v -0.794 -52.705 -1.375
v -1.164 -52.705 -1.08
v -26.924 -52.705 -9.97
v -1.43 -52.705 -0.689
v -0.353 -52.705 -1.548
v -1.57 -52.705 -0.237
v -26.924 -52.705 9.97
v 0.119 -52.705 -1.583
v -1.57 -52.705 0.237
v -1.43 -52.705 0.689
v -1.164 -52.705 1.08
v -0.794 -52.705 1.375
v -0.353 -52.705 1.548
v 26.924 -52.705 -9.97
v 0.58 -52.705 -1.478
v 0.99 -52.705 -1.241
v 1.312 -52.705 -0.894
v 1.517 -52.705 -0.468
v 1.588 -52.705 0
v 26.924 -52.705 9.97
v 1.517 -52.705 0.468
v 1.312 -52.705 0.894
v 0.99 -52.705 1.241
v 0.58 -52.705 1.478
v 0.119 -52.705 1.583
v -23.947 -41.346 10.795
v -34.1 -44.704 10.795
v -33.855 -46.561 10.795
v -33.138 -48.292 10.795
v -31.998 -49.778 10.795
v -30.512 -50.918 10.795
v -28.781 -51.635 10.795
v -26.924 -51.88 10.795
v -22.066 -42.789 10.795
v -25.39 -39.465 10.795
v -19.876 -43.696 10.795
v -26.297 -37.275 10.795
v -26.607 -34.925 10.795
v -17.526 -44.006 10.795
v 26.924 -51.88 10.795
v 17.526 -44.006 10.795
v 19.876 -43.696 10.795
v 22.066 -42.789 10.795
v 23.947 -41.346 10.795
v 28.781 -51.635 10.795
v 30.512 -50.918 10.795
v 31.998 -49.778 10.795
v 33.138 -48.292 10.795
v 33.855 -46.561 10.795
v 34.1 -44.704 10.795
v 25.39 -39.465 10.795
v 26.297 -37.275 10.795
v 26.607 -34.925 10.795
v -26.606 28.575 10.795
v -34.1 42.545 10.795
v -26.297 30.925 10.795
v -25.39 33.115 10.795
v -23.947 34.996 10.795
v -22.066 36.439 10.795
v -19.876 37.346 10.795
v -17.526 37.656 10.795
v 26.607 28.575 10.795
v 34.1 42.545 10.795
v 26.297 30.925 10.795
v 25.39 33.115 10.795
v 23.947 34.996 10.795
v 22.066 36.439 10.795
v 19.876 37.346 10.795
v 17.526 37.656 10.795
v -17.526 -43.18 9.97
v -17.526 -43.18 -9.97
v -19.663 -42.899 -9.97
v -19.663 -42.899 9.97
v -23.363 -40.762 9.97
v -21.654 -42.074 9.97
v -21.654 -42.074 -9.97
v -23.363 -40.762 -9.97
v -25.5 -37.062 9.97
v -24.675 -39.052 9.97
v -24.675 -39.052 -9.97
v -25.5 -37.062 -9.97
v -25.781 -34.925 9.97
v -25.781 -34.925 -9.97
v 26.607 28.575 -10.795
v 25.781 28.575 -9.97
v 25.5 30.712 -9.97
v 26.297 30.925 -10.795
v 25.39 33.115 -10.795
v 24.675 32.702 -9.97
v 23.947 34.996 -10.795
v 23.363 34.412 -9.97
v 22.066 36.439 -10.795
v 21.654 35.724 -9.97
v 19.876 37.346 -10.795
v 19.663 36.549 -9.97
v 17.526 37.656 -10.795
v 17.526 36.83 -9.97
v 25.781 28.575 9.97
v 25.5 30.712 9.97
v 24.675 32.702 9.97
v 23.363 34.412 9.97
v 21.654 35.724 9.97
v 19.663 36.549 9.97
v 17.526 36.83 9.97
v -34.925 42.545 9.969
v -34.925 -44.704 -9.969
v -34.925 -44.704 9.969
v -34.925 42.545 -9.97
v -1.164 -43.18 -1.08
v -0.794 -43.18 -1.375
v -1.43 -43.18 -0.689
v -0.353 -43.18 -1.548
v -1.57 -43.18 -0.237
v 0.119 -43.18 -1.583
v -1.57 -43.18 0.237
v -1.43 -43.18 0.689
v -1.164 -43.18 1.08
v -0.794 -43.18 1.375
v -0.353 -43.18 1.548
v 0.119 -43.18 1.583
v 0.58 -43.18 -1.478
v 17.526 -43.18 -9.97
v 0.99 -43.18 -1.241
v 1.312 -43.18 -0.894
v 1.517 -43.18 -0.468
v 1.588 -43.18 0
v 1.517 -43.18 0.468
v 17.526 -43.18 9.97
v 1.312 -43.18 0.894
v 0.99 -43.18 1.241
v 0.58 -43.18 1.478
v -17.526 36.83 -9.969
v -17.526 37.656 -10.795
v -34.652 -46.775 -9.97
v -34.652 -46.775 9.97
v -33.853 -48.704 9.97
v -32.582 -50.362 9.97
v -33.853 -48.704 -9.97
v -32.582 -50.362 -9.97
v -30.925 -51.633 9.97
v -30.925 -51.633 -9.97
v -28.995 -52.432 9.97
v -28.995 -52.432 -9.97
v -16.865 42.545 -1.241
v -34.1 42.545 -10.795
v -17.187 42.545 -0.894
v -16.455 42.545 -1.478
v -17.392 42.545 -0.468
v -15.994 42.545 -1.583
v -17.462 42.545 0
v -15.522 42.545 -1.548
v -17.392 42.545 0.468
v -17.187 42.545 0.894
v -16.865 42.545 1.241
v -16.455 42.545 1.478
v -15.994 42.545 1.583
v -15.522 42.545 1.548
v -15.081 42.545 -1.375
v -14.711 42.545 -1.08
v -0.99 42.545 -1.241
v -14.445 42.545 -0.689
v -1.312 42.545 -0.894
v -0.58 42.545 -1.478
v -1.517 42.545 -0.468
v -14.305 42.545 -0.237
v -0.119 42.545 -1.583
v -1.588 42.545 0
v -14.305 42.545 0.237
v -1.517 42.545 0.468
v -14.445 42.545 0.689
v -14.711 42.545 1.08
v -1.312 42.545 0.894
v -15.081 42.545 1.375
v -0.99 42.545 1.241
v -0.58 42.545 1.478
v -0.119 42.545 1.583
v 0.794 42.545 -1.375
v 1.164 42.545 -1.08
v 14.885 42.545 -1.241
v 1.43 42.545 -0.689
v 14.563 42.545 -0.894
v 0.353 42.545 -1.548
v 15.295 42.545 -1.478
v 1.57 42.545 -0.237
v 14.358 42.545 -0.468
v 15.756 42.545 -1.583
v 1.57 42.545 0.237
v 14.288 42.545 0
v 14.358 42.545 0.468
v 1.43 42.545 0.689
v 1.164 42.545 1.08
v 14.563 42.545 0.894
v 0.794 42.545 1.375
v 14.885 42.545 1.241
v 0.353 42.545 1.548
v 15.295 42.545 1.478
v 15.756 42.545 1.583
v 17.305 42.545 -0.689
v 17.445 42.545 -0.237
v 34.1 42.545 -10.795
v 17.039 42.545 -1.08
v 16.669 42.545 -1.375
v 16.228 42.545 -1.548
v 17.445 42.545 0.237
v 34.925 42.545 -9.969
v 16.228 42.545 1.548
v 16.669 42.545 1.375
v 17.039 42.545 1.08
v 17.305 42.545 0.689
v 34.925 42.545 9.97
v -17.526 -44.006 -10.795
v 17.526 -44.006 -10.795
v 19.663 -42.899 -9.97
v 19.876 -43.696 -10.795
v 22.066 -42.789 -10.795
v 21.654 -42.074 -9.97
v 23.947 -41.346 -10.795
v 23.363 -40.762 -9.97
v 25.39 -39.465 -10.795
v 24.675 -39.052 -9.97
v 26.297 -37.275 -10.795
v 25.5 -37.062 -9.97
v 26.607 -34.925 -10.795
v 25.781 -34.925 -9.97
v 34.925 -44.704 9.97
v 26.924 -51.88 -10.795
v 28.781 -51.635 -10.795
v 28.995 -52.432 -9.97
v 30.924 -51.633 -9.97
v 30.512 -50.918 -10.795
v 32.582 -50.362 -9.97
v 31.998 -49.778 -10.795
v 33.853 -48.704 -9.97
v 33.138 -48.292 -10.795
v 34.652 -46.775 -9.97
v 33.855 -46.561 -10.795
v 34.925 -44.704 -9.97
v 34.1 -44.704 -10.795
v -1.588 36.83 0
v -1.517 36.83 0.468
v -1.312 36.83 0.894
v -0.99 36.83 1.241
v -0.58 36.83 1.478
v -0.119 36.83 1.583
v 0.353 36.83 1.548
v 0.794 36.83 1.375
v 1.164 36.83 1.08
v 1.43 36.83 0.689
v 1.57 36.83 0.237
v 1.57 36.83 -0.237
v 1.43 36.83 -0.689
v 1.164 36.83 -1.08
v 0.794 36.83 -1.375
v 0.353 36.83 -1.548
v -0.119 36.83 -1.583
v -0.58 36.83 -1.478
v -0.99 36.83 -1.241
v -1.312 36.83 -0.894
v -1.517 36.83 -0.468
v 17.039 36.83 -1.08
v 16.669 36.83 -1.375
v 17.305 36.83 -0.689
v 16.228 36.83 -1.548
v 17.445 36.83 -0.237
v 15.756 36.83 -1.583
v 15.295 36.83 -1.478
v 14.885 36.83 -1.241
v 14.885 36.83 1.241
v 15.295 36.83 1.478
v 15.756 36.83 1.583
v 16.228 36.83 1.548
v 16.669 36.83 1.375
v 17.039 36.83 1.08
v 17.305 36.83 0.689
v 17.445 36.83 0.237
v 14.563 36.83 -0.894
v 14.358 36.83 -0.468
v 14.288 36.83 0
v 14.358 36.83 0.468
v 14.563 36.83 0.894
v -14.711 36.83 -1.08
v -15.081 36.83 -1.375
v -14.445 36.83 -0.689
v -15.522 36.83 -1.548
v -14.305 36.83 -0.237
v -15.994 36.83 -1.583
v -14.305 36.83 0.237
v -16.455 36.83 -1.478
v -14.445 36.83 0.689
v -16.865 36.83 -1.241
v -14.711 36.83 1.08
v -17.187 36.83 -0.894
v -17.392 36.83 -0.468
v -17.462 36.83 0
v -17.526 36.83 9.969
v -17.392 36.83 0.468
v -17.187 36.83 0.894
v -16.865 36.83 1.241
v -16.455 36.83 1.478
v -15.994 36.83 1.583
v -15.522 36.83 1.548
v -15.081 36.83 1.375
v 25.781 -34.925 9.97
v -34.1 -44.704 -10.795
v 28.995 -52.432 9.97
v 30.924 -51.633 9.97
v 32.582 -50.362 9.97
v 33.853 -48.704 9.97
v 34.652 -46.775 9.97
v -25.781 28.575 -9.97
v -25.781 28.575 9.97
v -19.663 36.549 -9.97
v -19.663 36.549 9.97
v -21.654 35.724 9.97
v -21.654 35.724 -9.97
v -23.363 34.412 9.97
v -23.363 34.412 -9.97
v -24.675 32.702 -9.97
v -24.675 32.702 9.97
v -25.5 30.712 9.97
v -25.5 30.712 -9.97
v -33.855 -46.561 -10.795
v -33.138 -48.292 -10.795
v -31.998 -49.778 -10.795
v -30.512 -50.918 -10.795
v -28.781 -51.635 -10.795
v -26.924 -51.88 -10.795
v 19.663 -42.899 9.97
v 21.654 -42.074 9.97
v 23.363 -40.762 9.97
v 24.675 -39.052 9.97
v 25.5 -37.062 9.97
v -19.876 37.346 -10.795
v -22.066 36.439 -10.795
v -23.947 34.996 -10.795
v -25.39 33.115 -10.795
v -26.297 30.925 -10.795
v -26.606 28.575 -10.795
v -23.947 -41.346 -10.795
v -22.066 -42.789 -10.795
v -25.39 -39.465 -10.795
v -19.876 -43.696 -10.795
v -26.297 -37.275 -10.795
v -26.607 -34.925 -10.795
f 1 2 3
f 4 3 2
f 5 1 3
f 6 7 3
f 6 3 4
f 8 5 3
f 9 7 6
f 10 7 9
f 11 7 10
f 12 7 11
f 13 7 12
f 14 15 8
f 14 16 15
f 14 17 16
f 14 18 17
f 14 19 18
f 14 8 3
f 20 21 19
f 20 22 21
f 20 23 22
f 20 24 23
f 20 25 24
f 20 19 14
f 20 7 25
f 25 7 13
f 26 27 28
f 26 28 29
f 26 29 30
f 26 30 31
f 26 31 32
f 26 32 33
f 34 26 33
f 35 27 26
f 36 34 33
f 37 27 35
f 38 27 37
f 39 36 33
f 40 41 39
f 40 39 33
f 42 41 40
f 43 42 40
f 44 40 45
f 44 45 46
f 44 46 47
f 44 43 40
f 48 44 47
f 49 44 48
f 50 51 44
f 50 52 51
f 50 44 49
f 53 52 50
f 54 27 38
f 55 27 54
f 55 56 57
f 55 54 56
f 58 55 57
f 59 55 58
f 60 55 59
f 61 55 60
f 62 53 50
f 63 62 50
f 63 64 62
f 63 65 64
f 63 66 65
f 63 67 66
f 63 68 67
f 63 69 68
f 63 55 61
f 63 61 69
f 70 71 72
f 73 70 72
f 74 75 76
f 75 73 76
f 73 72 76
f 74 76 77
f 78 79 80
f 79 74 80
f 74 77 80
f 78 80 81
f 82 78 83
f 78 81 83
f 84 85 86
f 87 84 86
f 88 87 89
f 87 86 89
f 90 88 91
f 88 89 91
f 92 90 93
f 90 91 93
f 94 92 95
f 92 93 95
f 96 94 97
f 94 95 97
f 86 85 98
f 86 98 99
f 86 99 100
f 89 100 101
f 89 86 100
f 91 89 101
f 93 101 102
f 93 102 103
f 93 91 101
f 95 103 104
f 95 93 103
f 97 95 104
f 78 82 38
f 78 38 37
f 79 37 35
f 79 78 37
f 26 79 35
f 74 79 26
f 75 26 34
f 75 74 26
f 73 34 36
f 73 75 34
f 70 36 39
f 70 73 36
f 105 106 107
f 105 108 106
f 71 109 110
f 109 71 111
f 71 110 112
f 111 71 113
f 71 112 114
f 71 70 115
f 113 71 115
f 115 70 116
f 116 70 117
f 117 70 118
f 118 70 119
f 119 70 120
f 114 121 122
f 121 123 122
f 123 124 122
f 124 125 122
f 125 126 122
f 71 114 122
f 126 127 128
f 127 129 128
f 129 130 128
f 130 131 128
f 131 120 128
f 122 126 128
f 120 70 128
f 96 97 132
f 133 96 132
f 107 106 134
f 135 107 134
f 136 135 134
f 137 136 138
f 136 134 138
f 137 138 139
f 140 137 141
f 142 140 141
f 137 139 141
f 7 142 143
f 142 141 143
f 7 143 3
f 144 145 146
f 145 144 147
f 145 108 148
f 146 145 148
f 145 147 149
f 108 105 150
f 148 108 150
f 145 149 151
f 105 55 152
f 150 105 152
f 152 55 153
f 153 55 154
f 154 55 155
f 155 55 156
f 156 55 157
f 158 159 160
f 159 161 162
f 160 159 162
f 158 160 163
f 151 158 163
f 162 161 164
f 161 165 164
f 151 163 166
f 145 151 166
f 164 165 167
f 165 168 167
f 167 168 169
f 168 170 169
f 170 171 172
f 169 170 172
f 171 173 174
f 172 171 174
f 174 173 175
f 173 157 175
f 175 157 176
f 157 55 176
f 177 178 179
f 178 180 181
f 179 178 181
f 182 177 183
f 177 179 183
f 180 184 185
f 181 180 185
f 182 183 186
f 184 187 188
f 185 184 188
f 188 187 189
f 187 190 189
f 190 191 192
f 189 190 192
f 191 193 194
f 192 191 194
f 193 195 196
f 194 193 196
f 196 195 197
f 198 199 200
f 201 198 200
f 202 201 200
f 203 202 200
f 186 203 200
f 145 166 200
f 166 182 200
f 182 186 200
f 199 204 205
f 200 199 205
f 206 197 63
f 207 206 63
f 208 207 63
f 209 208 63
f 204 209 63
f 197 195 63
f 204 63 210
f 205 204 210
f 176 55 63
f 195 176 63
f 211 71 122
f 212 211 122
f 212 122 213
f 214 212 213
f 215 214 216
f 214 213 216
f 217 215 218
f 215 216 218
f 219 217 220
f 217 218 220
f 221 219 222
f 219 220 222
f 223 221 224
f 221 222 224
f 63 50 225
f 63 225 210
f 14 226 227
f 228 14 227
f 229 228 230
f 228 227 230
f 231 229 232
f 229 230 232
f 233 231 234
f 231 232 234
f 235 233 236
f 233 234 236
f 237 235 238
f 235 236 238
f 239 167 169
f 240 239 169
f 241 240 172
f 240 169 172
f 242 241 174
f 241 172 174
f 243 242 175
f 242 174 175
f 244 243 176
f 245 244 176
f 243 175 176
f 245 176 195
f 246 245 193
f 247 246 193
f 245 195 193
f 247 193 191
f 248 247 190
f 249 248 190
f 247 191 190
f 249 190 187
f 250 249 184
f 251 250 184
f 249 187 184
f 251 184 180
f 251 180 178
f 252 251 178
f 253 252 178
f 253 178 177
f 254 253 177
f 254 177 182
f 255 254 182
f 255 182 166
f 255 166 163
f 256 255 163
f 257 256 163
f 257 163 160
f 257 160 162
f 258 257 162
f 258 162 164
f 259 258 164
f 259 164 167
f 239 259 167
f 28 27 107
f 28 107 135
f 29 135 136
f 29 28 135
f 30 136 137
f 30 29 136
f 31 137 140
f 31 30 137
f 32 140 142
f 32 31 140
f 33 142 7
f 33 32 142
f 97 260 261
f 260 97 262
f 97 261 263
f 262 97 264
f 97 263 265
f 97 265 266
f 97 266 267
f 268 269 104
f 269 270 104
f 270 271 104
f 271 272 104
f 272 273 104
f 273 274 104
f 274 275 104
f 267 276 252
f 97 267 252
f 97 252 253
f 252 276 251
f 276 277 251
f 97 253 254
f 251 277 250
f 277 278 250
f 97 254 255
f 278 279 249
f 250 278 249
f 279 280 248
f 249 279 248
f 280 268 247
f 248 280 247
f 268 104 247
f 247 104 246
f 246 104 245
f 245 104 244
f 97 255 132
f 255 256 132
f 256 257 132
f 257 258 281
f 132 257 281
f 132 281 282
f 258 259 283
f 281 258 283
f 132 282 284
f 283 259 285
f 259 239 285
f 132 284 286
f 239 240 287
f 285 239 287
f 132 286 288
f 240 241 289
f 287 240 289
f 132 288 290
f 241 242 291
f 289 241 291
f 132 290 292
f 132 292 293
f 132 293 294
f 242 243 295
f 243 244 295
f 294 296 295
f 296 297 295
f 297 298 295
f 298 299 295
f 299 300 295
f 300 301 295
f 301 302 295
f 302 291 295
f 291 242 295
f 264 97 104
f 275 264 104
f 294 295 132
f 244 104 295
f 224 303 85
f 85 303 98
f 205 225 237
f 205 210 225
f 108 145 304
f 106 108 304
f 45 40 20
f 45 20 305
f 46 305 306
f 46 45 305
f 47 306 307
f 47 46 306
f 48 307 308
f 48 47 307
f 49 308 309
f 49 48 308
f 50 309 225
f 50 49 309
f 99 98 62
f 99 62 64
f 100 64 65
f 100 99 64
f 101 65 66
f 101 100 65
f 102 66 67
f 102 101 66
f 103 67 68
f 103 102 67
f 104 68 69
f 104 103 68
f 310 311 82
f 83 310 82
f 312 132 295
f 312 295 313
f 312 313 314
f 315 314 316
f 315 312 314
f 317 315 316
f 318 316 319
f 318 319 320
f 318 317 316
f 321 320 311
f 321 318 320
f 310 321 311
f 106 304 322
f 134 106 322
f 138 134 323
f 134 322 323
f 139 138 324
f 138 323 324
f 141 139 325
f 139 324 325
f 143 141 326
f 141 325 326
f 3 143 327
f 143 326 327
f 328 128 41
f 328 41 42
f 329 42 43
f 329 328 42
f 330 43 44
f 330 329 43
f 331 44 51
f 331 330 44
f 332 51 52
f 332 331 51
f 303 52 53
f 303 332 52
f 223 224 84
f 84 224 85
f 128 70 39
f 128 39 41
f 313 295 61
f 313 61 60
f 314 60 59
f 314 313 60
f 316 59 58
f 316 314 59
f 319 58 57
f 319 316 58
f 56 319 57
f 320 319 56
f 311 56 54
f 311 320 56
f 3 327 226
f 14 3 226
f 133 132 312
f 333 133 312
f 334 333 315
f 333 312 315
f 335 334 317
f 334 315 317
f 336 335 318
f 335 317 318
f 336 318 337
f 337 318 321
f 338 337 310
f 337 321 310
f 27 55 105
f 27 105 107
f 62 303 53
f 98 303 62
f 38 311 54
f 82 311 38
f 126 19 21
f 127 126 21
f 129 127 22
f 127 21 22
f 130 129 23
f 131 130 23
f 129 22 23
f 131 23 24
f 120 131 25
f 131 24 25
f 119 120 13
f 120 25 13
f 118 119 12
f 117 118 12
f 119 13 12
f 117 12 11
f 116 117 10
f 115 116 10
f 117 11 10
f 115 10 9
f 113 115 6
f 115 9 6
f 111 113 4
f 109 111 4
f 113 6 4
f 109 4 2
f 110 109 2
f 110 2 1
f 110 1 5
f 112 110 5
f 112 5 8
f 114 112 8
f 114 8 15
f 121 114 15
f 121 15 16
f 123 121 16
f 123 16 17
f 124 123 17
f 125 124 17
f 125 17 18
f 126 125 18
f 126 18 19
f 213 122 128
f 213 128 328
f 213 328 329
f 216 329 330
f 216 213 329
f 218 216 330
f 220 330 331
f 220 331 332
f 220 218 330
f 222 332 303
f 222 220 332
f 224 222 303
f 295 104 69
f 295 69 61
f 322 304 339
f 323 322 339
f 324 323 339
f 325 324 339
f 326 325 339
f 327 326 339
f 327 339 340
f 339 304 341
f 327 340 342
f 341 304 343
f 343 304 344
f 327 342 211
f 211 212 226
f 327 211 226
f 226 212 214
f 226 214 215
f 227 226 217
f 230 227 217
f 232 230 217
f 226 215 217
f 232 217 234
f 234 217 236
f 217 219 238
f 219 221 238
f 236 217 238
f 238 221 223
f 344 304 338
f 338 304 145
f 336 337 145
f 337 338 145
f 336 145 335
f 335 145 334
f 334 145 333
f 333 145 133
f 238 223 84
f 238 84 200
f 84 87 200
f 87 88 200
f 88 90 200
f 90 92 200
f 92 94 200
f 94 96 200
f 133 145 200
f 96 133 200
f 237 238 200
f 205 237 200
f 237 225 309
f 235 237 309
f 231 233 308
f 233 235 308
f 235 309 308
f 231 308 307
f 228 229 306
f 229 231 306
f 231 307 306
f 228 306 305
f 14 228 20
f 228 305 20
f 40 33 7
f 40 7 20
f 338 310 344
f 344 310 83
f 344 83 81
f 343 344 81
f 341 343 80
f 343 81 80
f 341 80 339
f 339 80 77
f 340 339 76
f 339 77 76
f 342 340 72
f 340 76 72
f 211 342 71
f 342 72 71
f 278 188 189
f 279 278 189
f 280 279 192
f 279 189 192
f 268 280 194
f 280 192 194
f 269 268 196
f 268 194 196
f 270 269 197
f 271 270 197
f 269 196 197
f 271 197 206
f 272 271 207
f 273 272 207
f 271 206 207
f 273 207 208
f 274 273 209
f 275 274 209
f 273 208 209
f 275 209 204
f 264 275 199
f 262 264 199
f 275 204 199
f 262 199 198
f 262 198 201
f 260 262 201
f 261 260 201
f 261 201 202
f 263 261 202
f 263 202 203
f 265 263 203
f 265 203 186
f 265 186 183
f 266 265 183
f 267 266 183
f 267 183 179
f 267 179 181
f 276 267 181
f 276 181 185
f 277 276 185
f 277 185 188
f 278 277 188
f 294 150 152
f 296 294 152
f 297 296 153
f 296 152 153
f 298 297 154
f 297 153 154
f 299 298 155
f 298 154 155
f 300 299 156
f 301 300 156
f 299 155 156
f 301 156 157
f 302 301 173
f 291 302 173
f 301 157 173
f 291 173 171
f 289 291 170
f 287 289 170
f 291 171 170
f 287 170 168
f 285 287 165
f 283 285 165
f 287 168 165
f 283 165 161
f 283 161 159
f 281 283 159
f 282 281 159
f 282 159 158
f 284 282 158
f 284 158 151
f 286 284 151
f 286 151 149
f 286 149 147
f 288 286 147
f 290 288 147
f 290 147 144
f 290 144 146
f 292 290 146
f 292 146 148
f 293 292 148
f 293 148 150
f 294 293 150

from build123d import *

# Parameters (mm, degrees)
F0_W      = 34.925
F0_H      = 52.705
F1_DEPTH  = 10.795
F2_DEPTH  = 10.795
F3_W      = 25.781
F3_H      = 43.18
F3_H_2    = 36.83
F4_DEPTH  = 25.4
F5_R      = 8.255
F6_W      = 34.925
F6_H      = 19.05
F7_DEPTH  = 5.08
F8_R      = 1.5875
F9_DEPTH  = 50.8
F10_R     = 7.493
F11_DEPTH = 76.2
F12_R     = 8.001
F13_R     = 1.5875
F14_DEPTH = 25.4
F15_SIZE  = 0.762
F16_R     = 2.54
F17_SIZE  = 0.8255
F19_W     = 73.3495355977
F19_H     = 43.3503502247
F20_DEPTH = 25.4
F21_R     = 1.5875
F22_DEPTH = 25.4


with BuildPart() as f1:
    # F0 (on Top) → F1 (new body)
    with BuildSketch(Plane.XY):
        with Locations((-17.4625, -26.3525)):
            Rectangle(F0_W, F0_H)
        with Locations((-17.4625, 26.3525)):
            Rectangle(F0_W, F0_H)
        Polygon((0, 52.705), (0, 0), (0, -52.705), (34.925, -52.705), (34.925, 0), (34.925, 52.705), align=None)
    extrude(amount=F1_DEPTH)

    # F0 (on Top) → F2 (join)
    with BuildSketch(Plane.XY):
        with Locations((-17.4625, -26.3525)):
            Rectangle(F0_W, F0_H)
        with Locations((-17.4625, 26.3525)):
            Rectangle(F0_W, F0_H)
        Polygon((0, 52.705), (0, 0), (0, -52.705), (34.925, -52.705), (34.925, 0), (34.925, 52.705), align=None)
    extrude(amount=-F2_DEPTH)

    # F3 (on face) → F4 (cut)
    with BuildSketch(Plane.XY.offset(10.795)):
        with Locations((-12.8905, -21.59)):
            Rectangle(F3_W, F3_H)
        with Locations((-12.8905, 18.415)):
            Rectangle(F3_W, F3_H_2)
        with Locations((12.8905, -21.59)):
            Rectangle(F3_W, F3_H)
        with Locations((12.8905, 18.415)):
            Rectangle(F3_W, F3_H_2)
    extrude(amount=-F4_DEPTH, mode=Mode.SUBTRACT)

    # F5
    f5_edges = [f1.edges().sort_by_distance(p)[0] for p in [
        (-25.781, 36.83, 0),
        (25.781, 36.83, 0),
        (-25.781, -43.18, 0),
        (25.781, -43.18, 0),
    ]]
    fillet(f5_edges, radius=F5_R)

    # F6 (on face) → F7 (join)
    with BuildSketch(Plane(origin=(0, 52.705, 0), x_dir=(-1, 0, 0), z_dir=(0, 1, 0))):
        Polygon((-34.925, 0), (0, 0), (0, -19.05), (34.925, -19.05), (34.925, 0), (34.925, 19.05), (0, 19.05), (-34.925, 19.05), align=None)
        with Locations((-17.4625, -9.525)):
            Rectangle(F6_W, F6_H)
    extrude(amount=-F7_DEPTH)

    # F8 (on face) → F9 (cut)
    with BuildSketch(Plane.XZ.offset(-47.625)):
        with Locations((22.225, 15.24)):
            Circle(F8_R)
        with Locations((0, 15.24)):
            Circle(F8_R)
        with Locations((0, -15.24)):
            Circle(F8_R)
        with Locations((22.225, -15.24)):
            Circle(F8_R)
        with Locations((-22.225, 15.24)):
            Circle(F8_R)
        with Locations((-22.225, -15.24)):
            Circle(F8_R)
    extrude(amount=-F9_DEPTH, mode=Mode.SUBTRACT)

    # F10 (on face) → F11 (cut)
    with BuildSketch(Plane(origin=(-34.925, 0, 0), x_dir=(0, -1, 0), z_dir=(-1, 0, 0))):
        with Locations((-52.705, 0)):
            Circle(F10_R)
    extrude(amount=-F11_DEPTH, mode=Mode.SUBTRACT)

    # F12
    f12_edges = [f1.edges().sort_by_distance(p)[0] for p in [
        (34.925, -52.705, 0),
        (-34.925, -52.705, 0),
    ]]
    fillet(f12_edges, radius=F12_R)

    # F13 (on face) → F14 (cut)
    with BuildSketch(Plane(origin=(0, 52.705, 0), x_dir=(-1, 0, 0), z_dir=(0, 1, 0))):
        Circle(F13_R)
        with Locations((-15.875, 0)):
            Circle(F13_R)
        with Locations((15.875, 0)):
            Circle(F13_R)
    extrude(amount=-F14_DEPTH, mode=Mode.SUBTRACT)

    # F15
    f15_edges = [f1.edges().sort_by_distance(p)[0] for p in [
        (17.4625, 45.212, 0),
        (1.5875, 45.212, 0),
        (-14.2875, 45.212, 0),
    ]]
    chamfer(f15_edges, length=F15_SIZE)

    # F16
    f16_edges = [f1.edges().sort_by_distance(p)[0] for p in [
        (0, 47.625, -10.795),
        (0, 47.625, 10.795),
    ]]
    fillet(f16_edges, radius=F16_R)

    # F17
    f17_edges = [f1.edges().sort_by_distance(p)[0] for p in [
        (25.781, -3.175, 10.795),
        (34.925, 0.1905, 10.795),
        (34.925, 0.1905, -10.795),
        (25.781, -3.175, -10.795),
        (0, 47.625, -19.05),
        (0, 47.625, 19.05),
    ]]
    chamfer(f17_edges, length=F17_SIZE)

    # F19 (on offset) → F20 (cut)
    with BuildSketch(Plane.XZ.offset(-42.545)):
        with Locations((-0.421330399, -0.413473639)):
            Rectangle(F19_W, F19_H)
    extrude(amount=-F20_DEPTH, mode=Mode.SUBTRACT)

    # F21 (on face) → F22 (cut)
    with BuildSketch(Plane.XZ.offset(52.705)):
        Circle(F21_R)
    extrude(amount=-F22_DEPTH, mode=Mode.SUBTRACT)


solid = f1.part
